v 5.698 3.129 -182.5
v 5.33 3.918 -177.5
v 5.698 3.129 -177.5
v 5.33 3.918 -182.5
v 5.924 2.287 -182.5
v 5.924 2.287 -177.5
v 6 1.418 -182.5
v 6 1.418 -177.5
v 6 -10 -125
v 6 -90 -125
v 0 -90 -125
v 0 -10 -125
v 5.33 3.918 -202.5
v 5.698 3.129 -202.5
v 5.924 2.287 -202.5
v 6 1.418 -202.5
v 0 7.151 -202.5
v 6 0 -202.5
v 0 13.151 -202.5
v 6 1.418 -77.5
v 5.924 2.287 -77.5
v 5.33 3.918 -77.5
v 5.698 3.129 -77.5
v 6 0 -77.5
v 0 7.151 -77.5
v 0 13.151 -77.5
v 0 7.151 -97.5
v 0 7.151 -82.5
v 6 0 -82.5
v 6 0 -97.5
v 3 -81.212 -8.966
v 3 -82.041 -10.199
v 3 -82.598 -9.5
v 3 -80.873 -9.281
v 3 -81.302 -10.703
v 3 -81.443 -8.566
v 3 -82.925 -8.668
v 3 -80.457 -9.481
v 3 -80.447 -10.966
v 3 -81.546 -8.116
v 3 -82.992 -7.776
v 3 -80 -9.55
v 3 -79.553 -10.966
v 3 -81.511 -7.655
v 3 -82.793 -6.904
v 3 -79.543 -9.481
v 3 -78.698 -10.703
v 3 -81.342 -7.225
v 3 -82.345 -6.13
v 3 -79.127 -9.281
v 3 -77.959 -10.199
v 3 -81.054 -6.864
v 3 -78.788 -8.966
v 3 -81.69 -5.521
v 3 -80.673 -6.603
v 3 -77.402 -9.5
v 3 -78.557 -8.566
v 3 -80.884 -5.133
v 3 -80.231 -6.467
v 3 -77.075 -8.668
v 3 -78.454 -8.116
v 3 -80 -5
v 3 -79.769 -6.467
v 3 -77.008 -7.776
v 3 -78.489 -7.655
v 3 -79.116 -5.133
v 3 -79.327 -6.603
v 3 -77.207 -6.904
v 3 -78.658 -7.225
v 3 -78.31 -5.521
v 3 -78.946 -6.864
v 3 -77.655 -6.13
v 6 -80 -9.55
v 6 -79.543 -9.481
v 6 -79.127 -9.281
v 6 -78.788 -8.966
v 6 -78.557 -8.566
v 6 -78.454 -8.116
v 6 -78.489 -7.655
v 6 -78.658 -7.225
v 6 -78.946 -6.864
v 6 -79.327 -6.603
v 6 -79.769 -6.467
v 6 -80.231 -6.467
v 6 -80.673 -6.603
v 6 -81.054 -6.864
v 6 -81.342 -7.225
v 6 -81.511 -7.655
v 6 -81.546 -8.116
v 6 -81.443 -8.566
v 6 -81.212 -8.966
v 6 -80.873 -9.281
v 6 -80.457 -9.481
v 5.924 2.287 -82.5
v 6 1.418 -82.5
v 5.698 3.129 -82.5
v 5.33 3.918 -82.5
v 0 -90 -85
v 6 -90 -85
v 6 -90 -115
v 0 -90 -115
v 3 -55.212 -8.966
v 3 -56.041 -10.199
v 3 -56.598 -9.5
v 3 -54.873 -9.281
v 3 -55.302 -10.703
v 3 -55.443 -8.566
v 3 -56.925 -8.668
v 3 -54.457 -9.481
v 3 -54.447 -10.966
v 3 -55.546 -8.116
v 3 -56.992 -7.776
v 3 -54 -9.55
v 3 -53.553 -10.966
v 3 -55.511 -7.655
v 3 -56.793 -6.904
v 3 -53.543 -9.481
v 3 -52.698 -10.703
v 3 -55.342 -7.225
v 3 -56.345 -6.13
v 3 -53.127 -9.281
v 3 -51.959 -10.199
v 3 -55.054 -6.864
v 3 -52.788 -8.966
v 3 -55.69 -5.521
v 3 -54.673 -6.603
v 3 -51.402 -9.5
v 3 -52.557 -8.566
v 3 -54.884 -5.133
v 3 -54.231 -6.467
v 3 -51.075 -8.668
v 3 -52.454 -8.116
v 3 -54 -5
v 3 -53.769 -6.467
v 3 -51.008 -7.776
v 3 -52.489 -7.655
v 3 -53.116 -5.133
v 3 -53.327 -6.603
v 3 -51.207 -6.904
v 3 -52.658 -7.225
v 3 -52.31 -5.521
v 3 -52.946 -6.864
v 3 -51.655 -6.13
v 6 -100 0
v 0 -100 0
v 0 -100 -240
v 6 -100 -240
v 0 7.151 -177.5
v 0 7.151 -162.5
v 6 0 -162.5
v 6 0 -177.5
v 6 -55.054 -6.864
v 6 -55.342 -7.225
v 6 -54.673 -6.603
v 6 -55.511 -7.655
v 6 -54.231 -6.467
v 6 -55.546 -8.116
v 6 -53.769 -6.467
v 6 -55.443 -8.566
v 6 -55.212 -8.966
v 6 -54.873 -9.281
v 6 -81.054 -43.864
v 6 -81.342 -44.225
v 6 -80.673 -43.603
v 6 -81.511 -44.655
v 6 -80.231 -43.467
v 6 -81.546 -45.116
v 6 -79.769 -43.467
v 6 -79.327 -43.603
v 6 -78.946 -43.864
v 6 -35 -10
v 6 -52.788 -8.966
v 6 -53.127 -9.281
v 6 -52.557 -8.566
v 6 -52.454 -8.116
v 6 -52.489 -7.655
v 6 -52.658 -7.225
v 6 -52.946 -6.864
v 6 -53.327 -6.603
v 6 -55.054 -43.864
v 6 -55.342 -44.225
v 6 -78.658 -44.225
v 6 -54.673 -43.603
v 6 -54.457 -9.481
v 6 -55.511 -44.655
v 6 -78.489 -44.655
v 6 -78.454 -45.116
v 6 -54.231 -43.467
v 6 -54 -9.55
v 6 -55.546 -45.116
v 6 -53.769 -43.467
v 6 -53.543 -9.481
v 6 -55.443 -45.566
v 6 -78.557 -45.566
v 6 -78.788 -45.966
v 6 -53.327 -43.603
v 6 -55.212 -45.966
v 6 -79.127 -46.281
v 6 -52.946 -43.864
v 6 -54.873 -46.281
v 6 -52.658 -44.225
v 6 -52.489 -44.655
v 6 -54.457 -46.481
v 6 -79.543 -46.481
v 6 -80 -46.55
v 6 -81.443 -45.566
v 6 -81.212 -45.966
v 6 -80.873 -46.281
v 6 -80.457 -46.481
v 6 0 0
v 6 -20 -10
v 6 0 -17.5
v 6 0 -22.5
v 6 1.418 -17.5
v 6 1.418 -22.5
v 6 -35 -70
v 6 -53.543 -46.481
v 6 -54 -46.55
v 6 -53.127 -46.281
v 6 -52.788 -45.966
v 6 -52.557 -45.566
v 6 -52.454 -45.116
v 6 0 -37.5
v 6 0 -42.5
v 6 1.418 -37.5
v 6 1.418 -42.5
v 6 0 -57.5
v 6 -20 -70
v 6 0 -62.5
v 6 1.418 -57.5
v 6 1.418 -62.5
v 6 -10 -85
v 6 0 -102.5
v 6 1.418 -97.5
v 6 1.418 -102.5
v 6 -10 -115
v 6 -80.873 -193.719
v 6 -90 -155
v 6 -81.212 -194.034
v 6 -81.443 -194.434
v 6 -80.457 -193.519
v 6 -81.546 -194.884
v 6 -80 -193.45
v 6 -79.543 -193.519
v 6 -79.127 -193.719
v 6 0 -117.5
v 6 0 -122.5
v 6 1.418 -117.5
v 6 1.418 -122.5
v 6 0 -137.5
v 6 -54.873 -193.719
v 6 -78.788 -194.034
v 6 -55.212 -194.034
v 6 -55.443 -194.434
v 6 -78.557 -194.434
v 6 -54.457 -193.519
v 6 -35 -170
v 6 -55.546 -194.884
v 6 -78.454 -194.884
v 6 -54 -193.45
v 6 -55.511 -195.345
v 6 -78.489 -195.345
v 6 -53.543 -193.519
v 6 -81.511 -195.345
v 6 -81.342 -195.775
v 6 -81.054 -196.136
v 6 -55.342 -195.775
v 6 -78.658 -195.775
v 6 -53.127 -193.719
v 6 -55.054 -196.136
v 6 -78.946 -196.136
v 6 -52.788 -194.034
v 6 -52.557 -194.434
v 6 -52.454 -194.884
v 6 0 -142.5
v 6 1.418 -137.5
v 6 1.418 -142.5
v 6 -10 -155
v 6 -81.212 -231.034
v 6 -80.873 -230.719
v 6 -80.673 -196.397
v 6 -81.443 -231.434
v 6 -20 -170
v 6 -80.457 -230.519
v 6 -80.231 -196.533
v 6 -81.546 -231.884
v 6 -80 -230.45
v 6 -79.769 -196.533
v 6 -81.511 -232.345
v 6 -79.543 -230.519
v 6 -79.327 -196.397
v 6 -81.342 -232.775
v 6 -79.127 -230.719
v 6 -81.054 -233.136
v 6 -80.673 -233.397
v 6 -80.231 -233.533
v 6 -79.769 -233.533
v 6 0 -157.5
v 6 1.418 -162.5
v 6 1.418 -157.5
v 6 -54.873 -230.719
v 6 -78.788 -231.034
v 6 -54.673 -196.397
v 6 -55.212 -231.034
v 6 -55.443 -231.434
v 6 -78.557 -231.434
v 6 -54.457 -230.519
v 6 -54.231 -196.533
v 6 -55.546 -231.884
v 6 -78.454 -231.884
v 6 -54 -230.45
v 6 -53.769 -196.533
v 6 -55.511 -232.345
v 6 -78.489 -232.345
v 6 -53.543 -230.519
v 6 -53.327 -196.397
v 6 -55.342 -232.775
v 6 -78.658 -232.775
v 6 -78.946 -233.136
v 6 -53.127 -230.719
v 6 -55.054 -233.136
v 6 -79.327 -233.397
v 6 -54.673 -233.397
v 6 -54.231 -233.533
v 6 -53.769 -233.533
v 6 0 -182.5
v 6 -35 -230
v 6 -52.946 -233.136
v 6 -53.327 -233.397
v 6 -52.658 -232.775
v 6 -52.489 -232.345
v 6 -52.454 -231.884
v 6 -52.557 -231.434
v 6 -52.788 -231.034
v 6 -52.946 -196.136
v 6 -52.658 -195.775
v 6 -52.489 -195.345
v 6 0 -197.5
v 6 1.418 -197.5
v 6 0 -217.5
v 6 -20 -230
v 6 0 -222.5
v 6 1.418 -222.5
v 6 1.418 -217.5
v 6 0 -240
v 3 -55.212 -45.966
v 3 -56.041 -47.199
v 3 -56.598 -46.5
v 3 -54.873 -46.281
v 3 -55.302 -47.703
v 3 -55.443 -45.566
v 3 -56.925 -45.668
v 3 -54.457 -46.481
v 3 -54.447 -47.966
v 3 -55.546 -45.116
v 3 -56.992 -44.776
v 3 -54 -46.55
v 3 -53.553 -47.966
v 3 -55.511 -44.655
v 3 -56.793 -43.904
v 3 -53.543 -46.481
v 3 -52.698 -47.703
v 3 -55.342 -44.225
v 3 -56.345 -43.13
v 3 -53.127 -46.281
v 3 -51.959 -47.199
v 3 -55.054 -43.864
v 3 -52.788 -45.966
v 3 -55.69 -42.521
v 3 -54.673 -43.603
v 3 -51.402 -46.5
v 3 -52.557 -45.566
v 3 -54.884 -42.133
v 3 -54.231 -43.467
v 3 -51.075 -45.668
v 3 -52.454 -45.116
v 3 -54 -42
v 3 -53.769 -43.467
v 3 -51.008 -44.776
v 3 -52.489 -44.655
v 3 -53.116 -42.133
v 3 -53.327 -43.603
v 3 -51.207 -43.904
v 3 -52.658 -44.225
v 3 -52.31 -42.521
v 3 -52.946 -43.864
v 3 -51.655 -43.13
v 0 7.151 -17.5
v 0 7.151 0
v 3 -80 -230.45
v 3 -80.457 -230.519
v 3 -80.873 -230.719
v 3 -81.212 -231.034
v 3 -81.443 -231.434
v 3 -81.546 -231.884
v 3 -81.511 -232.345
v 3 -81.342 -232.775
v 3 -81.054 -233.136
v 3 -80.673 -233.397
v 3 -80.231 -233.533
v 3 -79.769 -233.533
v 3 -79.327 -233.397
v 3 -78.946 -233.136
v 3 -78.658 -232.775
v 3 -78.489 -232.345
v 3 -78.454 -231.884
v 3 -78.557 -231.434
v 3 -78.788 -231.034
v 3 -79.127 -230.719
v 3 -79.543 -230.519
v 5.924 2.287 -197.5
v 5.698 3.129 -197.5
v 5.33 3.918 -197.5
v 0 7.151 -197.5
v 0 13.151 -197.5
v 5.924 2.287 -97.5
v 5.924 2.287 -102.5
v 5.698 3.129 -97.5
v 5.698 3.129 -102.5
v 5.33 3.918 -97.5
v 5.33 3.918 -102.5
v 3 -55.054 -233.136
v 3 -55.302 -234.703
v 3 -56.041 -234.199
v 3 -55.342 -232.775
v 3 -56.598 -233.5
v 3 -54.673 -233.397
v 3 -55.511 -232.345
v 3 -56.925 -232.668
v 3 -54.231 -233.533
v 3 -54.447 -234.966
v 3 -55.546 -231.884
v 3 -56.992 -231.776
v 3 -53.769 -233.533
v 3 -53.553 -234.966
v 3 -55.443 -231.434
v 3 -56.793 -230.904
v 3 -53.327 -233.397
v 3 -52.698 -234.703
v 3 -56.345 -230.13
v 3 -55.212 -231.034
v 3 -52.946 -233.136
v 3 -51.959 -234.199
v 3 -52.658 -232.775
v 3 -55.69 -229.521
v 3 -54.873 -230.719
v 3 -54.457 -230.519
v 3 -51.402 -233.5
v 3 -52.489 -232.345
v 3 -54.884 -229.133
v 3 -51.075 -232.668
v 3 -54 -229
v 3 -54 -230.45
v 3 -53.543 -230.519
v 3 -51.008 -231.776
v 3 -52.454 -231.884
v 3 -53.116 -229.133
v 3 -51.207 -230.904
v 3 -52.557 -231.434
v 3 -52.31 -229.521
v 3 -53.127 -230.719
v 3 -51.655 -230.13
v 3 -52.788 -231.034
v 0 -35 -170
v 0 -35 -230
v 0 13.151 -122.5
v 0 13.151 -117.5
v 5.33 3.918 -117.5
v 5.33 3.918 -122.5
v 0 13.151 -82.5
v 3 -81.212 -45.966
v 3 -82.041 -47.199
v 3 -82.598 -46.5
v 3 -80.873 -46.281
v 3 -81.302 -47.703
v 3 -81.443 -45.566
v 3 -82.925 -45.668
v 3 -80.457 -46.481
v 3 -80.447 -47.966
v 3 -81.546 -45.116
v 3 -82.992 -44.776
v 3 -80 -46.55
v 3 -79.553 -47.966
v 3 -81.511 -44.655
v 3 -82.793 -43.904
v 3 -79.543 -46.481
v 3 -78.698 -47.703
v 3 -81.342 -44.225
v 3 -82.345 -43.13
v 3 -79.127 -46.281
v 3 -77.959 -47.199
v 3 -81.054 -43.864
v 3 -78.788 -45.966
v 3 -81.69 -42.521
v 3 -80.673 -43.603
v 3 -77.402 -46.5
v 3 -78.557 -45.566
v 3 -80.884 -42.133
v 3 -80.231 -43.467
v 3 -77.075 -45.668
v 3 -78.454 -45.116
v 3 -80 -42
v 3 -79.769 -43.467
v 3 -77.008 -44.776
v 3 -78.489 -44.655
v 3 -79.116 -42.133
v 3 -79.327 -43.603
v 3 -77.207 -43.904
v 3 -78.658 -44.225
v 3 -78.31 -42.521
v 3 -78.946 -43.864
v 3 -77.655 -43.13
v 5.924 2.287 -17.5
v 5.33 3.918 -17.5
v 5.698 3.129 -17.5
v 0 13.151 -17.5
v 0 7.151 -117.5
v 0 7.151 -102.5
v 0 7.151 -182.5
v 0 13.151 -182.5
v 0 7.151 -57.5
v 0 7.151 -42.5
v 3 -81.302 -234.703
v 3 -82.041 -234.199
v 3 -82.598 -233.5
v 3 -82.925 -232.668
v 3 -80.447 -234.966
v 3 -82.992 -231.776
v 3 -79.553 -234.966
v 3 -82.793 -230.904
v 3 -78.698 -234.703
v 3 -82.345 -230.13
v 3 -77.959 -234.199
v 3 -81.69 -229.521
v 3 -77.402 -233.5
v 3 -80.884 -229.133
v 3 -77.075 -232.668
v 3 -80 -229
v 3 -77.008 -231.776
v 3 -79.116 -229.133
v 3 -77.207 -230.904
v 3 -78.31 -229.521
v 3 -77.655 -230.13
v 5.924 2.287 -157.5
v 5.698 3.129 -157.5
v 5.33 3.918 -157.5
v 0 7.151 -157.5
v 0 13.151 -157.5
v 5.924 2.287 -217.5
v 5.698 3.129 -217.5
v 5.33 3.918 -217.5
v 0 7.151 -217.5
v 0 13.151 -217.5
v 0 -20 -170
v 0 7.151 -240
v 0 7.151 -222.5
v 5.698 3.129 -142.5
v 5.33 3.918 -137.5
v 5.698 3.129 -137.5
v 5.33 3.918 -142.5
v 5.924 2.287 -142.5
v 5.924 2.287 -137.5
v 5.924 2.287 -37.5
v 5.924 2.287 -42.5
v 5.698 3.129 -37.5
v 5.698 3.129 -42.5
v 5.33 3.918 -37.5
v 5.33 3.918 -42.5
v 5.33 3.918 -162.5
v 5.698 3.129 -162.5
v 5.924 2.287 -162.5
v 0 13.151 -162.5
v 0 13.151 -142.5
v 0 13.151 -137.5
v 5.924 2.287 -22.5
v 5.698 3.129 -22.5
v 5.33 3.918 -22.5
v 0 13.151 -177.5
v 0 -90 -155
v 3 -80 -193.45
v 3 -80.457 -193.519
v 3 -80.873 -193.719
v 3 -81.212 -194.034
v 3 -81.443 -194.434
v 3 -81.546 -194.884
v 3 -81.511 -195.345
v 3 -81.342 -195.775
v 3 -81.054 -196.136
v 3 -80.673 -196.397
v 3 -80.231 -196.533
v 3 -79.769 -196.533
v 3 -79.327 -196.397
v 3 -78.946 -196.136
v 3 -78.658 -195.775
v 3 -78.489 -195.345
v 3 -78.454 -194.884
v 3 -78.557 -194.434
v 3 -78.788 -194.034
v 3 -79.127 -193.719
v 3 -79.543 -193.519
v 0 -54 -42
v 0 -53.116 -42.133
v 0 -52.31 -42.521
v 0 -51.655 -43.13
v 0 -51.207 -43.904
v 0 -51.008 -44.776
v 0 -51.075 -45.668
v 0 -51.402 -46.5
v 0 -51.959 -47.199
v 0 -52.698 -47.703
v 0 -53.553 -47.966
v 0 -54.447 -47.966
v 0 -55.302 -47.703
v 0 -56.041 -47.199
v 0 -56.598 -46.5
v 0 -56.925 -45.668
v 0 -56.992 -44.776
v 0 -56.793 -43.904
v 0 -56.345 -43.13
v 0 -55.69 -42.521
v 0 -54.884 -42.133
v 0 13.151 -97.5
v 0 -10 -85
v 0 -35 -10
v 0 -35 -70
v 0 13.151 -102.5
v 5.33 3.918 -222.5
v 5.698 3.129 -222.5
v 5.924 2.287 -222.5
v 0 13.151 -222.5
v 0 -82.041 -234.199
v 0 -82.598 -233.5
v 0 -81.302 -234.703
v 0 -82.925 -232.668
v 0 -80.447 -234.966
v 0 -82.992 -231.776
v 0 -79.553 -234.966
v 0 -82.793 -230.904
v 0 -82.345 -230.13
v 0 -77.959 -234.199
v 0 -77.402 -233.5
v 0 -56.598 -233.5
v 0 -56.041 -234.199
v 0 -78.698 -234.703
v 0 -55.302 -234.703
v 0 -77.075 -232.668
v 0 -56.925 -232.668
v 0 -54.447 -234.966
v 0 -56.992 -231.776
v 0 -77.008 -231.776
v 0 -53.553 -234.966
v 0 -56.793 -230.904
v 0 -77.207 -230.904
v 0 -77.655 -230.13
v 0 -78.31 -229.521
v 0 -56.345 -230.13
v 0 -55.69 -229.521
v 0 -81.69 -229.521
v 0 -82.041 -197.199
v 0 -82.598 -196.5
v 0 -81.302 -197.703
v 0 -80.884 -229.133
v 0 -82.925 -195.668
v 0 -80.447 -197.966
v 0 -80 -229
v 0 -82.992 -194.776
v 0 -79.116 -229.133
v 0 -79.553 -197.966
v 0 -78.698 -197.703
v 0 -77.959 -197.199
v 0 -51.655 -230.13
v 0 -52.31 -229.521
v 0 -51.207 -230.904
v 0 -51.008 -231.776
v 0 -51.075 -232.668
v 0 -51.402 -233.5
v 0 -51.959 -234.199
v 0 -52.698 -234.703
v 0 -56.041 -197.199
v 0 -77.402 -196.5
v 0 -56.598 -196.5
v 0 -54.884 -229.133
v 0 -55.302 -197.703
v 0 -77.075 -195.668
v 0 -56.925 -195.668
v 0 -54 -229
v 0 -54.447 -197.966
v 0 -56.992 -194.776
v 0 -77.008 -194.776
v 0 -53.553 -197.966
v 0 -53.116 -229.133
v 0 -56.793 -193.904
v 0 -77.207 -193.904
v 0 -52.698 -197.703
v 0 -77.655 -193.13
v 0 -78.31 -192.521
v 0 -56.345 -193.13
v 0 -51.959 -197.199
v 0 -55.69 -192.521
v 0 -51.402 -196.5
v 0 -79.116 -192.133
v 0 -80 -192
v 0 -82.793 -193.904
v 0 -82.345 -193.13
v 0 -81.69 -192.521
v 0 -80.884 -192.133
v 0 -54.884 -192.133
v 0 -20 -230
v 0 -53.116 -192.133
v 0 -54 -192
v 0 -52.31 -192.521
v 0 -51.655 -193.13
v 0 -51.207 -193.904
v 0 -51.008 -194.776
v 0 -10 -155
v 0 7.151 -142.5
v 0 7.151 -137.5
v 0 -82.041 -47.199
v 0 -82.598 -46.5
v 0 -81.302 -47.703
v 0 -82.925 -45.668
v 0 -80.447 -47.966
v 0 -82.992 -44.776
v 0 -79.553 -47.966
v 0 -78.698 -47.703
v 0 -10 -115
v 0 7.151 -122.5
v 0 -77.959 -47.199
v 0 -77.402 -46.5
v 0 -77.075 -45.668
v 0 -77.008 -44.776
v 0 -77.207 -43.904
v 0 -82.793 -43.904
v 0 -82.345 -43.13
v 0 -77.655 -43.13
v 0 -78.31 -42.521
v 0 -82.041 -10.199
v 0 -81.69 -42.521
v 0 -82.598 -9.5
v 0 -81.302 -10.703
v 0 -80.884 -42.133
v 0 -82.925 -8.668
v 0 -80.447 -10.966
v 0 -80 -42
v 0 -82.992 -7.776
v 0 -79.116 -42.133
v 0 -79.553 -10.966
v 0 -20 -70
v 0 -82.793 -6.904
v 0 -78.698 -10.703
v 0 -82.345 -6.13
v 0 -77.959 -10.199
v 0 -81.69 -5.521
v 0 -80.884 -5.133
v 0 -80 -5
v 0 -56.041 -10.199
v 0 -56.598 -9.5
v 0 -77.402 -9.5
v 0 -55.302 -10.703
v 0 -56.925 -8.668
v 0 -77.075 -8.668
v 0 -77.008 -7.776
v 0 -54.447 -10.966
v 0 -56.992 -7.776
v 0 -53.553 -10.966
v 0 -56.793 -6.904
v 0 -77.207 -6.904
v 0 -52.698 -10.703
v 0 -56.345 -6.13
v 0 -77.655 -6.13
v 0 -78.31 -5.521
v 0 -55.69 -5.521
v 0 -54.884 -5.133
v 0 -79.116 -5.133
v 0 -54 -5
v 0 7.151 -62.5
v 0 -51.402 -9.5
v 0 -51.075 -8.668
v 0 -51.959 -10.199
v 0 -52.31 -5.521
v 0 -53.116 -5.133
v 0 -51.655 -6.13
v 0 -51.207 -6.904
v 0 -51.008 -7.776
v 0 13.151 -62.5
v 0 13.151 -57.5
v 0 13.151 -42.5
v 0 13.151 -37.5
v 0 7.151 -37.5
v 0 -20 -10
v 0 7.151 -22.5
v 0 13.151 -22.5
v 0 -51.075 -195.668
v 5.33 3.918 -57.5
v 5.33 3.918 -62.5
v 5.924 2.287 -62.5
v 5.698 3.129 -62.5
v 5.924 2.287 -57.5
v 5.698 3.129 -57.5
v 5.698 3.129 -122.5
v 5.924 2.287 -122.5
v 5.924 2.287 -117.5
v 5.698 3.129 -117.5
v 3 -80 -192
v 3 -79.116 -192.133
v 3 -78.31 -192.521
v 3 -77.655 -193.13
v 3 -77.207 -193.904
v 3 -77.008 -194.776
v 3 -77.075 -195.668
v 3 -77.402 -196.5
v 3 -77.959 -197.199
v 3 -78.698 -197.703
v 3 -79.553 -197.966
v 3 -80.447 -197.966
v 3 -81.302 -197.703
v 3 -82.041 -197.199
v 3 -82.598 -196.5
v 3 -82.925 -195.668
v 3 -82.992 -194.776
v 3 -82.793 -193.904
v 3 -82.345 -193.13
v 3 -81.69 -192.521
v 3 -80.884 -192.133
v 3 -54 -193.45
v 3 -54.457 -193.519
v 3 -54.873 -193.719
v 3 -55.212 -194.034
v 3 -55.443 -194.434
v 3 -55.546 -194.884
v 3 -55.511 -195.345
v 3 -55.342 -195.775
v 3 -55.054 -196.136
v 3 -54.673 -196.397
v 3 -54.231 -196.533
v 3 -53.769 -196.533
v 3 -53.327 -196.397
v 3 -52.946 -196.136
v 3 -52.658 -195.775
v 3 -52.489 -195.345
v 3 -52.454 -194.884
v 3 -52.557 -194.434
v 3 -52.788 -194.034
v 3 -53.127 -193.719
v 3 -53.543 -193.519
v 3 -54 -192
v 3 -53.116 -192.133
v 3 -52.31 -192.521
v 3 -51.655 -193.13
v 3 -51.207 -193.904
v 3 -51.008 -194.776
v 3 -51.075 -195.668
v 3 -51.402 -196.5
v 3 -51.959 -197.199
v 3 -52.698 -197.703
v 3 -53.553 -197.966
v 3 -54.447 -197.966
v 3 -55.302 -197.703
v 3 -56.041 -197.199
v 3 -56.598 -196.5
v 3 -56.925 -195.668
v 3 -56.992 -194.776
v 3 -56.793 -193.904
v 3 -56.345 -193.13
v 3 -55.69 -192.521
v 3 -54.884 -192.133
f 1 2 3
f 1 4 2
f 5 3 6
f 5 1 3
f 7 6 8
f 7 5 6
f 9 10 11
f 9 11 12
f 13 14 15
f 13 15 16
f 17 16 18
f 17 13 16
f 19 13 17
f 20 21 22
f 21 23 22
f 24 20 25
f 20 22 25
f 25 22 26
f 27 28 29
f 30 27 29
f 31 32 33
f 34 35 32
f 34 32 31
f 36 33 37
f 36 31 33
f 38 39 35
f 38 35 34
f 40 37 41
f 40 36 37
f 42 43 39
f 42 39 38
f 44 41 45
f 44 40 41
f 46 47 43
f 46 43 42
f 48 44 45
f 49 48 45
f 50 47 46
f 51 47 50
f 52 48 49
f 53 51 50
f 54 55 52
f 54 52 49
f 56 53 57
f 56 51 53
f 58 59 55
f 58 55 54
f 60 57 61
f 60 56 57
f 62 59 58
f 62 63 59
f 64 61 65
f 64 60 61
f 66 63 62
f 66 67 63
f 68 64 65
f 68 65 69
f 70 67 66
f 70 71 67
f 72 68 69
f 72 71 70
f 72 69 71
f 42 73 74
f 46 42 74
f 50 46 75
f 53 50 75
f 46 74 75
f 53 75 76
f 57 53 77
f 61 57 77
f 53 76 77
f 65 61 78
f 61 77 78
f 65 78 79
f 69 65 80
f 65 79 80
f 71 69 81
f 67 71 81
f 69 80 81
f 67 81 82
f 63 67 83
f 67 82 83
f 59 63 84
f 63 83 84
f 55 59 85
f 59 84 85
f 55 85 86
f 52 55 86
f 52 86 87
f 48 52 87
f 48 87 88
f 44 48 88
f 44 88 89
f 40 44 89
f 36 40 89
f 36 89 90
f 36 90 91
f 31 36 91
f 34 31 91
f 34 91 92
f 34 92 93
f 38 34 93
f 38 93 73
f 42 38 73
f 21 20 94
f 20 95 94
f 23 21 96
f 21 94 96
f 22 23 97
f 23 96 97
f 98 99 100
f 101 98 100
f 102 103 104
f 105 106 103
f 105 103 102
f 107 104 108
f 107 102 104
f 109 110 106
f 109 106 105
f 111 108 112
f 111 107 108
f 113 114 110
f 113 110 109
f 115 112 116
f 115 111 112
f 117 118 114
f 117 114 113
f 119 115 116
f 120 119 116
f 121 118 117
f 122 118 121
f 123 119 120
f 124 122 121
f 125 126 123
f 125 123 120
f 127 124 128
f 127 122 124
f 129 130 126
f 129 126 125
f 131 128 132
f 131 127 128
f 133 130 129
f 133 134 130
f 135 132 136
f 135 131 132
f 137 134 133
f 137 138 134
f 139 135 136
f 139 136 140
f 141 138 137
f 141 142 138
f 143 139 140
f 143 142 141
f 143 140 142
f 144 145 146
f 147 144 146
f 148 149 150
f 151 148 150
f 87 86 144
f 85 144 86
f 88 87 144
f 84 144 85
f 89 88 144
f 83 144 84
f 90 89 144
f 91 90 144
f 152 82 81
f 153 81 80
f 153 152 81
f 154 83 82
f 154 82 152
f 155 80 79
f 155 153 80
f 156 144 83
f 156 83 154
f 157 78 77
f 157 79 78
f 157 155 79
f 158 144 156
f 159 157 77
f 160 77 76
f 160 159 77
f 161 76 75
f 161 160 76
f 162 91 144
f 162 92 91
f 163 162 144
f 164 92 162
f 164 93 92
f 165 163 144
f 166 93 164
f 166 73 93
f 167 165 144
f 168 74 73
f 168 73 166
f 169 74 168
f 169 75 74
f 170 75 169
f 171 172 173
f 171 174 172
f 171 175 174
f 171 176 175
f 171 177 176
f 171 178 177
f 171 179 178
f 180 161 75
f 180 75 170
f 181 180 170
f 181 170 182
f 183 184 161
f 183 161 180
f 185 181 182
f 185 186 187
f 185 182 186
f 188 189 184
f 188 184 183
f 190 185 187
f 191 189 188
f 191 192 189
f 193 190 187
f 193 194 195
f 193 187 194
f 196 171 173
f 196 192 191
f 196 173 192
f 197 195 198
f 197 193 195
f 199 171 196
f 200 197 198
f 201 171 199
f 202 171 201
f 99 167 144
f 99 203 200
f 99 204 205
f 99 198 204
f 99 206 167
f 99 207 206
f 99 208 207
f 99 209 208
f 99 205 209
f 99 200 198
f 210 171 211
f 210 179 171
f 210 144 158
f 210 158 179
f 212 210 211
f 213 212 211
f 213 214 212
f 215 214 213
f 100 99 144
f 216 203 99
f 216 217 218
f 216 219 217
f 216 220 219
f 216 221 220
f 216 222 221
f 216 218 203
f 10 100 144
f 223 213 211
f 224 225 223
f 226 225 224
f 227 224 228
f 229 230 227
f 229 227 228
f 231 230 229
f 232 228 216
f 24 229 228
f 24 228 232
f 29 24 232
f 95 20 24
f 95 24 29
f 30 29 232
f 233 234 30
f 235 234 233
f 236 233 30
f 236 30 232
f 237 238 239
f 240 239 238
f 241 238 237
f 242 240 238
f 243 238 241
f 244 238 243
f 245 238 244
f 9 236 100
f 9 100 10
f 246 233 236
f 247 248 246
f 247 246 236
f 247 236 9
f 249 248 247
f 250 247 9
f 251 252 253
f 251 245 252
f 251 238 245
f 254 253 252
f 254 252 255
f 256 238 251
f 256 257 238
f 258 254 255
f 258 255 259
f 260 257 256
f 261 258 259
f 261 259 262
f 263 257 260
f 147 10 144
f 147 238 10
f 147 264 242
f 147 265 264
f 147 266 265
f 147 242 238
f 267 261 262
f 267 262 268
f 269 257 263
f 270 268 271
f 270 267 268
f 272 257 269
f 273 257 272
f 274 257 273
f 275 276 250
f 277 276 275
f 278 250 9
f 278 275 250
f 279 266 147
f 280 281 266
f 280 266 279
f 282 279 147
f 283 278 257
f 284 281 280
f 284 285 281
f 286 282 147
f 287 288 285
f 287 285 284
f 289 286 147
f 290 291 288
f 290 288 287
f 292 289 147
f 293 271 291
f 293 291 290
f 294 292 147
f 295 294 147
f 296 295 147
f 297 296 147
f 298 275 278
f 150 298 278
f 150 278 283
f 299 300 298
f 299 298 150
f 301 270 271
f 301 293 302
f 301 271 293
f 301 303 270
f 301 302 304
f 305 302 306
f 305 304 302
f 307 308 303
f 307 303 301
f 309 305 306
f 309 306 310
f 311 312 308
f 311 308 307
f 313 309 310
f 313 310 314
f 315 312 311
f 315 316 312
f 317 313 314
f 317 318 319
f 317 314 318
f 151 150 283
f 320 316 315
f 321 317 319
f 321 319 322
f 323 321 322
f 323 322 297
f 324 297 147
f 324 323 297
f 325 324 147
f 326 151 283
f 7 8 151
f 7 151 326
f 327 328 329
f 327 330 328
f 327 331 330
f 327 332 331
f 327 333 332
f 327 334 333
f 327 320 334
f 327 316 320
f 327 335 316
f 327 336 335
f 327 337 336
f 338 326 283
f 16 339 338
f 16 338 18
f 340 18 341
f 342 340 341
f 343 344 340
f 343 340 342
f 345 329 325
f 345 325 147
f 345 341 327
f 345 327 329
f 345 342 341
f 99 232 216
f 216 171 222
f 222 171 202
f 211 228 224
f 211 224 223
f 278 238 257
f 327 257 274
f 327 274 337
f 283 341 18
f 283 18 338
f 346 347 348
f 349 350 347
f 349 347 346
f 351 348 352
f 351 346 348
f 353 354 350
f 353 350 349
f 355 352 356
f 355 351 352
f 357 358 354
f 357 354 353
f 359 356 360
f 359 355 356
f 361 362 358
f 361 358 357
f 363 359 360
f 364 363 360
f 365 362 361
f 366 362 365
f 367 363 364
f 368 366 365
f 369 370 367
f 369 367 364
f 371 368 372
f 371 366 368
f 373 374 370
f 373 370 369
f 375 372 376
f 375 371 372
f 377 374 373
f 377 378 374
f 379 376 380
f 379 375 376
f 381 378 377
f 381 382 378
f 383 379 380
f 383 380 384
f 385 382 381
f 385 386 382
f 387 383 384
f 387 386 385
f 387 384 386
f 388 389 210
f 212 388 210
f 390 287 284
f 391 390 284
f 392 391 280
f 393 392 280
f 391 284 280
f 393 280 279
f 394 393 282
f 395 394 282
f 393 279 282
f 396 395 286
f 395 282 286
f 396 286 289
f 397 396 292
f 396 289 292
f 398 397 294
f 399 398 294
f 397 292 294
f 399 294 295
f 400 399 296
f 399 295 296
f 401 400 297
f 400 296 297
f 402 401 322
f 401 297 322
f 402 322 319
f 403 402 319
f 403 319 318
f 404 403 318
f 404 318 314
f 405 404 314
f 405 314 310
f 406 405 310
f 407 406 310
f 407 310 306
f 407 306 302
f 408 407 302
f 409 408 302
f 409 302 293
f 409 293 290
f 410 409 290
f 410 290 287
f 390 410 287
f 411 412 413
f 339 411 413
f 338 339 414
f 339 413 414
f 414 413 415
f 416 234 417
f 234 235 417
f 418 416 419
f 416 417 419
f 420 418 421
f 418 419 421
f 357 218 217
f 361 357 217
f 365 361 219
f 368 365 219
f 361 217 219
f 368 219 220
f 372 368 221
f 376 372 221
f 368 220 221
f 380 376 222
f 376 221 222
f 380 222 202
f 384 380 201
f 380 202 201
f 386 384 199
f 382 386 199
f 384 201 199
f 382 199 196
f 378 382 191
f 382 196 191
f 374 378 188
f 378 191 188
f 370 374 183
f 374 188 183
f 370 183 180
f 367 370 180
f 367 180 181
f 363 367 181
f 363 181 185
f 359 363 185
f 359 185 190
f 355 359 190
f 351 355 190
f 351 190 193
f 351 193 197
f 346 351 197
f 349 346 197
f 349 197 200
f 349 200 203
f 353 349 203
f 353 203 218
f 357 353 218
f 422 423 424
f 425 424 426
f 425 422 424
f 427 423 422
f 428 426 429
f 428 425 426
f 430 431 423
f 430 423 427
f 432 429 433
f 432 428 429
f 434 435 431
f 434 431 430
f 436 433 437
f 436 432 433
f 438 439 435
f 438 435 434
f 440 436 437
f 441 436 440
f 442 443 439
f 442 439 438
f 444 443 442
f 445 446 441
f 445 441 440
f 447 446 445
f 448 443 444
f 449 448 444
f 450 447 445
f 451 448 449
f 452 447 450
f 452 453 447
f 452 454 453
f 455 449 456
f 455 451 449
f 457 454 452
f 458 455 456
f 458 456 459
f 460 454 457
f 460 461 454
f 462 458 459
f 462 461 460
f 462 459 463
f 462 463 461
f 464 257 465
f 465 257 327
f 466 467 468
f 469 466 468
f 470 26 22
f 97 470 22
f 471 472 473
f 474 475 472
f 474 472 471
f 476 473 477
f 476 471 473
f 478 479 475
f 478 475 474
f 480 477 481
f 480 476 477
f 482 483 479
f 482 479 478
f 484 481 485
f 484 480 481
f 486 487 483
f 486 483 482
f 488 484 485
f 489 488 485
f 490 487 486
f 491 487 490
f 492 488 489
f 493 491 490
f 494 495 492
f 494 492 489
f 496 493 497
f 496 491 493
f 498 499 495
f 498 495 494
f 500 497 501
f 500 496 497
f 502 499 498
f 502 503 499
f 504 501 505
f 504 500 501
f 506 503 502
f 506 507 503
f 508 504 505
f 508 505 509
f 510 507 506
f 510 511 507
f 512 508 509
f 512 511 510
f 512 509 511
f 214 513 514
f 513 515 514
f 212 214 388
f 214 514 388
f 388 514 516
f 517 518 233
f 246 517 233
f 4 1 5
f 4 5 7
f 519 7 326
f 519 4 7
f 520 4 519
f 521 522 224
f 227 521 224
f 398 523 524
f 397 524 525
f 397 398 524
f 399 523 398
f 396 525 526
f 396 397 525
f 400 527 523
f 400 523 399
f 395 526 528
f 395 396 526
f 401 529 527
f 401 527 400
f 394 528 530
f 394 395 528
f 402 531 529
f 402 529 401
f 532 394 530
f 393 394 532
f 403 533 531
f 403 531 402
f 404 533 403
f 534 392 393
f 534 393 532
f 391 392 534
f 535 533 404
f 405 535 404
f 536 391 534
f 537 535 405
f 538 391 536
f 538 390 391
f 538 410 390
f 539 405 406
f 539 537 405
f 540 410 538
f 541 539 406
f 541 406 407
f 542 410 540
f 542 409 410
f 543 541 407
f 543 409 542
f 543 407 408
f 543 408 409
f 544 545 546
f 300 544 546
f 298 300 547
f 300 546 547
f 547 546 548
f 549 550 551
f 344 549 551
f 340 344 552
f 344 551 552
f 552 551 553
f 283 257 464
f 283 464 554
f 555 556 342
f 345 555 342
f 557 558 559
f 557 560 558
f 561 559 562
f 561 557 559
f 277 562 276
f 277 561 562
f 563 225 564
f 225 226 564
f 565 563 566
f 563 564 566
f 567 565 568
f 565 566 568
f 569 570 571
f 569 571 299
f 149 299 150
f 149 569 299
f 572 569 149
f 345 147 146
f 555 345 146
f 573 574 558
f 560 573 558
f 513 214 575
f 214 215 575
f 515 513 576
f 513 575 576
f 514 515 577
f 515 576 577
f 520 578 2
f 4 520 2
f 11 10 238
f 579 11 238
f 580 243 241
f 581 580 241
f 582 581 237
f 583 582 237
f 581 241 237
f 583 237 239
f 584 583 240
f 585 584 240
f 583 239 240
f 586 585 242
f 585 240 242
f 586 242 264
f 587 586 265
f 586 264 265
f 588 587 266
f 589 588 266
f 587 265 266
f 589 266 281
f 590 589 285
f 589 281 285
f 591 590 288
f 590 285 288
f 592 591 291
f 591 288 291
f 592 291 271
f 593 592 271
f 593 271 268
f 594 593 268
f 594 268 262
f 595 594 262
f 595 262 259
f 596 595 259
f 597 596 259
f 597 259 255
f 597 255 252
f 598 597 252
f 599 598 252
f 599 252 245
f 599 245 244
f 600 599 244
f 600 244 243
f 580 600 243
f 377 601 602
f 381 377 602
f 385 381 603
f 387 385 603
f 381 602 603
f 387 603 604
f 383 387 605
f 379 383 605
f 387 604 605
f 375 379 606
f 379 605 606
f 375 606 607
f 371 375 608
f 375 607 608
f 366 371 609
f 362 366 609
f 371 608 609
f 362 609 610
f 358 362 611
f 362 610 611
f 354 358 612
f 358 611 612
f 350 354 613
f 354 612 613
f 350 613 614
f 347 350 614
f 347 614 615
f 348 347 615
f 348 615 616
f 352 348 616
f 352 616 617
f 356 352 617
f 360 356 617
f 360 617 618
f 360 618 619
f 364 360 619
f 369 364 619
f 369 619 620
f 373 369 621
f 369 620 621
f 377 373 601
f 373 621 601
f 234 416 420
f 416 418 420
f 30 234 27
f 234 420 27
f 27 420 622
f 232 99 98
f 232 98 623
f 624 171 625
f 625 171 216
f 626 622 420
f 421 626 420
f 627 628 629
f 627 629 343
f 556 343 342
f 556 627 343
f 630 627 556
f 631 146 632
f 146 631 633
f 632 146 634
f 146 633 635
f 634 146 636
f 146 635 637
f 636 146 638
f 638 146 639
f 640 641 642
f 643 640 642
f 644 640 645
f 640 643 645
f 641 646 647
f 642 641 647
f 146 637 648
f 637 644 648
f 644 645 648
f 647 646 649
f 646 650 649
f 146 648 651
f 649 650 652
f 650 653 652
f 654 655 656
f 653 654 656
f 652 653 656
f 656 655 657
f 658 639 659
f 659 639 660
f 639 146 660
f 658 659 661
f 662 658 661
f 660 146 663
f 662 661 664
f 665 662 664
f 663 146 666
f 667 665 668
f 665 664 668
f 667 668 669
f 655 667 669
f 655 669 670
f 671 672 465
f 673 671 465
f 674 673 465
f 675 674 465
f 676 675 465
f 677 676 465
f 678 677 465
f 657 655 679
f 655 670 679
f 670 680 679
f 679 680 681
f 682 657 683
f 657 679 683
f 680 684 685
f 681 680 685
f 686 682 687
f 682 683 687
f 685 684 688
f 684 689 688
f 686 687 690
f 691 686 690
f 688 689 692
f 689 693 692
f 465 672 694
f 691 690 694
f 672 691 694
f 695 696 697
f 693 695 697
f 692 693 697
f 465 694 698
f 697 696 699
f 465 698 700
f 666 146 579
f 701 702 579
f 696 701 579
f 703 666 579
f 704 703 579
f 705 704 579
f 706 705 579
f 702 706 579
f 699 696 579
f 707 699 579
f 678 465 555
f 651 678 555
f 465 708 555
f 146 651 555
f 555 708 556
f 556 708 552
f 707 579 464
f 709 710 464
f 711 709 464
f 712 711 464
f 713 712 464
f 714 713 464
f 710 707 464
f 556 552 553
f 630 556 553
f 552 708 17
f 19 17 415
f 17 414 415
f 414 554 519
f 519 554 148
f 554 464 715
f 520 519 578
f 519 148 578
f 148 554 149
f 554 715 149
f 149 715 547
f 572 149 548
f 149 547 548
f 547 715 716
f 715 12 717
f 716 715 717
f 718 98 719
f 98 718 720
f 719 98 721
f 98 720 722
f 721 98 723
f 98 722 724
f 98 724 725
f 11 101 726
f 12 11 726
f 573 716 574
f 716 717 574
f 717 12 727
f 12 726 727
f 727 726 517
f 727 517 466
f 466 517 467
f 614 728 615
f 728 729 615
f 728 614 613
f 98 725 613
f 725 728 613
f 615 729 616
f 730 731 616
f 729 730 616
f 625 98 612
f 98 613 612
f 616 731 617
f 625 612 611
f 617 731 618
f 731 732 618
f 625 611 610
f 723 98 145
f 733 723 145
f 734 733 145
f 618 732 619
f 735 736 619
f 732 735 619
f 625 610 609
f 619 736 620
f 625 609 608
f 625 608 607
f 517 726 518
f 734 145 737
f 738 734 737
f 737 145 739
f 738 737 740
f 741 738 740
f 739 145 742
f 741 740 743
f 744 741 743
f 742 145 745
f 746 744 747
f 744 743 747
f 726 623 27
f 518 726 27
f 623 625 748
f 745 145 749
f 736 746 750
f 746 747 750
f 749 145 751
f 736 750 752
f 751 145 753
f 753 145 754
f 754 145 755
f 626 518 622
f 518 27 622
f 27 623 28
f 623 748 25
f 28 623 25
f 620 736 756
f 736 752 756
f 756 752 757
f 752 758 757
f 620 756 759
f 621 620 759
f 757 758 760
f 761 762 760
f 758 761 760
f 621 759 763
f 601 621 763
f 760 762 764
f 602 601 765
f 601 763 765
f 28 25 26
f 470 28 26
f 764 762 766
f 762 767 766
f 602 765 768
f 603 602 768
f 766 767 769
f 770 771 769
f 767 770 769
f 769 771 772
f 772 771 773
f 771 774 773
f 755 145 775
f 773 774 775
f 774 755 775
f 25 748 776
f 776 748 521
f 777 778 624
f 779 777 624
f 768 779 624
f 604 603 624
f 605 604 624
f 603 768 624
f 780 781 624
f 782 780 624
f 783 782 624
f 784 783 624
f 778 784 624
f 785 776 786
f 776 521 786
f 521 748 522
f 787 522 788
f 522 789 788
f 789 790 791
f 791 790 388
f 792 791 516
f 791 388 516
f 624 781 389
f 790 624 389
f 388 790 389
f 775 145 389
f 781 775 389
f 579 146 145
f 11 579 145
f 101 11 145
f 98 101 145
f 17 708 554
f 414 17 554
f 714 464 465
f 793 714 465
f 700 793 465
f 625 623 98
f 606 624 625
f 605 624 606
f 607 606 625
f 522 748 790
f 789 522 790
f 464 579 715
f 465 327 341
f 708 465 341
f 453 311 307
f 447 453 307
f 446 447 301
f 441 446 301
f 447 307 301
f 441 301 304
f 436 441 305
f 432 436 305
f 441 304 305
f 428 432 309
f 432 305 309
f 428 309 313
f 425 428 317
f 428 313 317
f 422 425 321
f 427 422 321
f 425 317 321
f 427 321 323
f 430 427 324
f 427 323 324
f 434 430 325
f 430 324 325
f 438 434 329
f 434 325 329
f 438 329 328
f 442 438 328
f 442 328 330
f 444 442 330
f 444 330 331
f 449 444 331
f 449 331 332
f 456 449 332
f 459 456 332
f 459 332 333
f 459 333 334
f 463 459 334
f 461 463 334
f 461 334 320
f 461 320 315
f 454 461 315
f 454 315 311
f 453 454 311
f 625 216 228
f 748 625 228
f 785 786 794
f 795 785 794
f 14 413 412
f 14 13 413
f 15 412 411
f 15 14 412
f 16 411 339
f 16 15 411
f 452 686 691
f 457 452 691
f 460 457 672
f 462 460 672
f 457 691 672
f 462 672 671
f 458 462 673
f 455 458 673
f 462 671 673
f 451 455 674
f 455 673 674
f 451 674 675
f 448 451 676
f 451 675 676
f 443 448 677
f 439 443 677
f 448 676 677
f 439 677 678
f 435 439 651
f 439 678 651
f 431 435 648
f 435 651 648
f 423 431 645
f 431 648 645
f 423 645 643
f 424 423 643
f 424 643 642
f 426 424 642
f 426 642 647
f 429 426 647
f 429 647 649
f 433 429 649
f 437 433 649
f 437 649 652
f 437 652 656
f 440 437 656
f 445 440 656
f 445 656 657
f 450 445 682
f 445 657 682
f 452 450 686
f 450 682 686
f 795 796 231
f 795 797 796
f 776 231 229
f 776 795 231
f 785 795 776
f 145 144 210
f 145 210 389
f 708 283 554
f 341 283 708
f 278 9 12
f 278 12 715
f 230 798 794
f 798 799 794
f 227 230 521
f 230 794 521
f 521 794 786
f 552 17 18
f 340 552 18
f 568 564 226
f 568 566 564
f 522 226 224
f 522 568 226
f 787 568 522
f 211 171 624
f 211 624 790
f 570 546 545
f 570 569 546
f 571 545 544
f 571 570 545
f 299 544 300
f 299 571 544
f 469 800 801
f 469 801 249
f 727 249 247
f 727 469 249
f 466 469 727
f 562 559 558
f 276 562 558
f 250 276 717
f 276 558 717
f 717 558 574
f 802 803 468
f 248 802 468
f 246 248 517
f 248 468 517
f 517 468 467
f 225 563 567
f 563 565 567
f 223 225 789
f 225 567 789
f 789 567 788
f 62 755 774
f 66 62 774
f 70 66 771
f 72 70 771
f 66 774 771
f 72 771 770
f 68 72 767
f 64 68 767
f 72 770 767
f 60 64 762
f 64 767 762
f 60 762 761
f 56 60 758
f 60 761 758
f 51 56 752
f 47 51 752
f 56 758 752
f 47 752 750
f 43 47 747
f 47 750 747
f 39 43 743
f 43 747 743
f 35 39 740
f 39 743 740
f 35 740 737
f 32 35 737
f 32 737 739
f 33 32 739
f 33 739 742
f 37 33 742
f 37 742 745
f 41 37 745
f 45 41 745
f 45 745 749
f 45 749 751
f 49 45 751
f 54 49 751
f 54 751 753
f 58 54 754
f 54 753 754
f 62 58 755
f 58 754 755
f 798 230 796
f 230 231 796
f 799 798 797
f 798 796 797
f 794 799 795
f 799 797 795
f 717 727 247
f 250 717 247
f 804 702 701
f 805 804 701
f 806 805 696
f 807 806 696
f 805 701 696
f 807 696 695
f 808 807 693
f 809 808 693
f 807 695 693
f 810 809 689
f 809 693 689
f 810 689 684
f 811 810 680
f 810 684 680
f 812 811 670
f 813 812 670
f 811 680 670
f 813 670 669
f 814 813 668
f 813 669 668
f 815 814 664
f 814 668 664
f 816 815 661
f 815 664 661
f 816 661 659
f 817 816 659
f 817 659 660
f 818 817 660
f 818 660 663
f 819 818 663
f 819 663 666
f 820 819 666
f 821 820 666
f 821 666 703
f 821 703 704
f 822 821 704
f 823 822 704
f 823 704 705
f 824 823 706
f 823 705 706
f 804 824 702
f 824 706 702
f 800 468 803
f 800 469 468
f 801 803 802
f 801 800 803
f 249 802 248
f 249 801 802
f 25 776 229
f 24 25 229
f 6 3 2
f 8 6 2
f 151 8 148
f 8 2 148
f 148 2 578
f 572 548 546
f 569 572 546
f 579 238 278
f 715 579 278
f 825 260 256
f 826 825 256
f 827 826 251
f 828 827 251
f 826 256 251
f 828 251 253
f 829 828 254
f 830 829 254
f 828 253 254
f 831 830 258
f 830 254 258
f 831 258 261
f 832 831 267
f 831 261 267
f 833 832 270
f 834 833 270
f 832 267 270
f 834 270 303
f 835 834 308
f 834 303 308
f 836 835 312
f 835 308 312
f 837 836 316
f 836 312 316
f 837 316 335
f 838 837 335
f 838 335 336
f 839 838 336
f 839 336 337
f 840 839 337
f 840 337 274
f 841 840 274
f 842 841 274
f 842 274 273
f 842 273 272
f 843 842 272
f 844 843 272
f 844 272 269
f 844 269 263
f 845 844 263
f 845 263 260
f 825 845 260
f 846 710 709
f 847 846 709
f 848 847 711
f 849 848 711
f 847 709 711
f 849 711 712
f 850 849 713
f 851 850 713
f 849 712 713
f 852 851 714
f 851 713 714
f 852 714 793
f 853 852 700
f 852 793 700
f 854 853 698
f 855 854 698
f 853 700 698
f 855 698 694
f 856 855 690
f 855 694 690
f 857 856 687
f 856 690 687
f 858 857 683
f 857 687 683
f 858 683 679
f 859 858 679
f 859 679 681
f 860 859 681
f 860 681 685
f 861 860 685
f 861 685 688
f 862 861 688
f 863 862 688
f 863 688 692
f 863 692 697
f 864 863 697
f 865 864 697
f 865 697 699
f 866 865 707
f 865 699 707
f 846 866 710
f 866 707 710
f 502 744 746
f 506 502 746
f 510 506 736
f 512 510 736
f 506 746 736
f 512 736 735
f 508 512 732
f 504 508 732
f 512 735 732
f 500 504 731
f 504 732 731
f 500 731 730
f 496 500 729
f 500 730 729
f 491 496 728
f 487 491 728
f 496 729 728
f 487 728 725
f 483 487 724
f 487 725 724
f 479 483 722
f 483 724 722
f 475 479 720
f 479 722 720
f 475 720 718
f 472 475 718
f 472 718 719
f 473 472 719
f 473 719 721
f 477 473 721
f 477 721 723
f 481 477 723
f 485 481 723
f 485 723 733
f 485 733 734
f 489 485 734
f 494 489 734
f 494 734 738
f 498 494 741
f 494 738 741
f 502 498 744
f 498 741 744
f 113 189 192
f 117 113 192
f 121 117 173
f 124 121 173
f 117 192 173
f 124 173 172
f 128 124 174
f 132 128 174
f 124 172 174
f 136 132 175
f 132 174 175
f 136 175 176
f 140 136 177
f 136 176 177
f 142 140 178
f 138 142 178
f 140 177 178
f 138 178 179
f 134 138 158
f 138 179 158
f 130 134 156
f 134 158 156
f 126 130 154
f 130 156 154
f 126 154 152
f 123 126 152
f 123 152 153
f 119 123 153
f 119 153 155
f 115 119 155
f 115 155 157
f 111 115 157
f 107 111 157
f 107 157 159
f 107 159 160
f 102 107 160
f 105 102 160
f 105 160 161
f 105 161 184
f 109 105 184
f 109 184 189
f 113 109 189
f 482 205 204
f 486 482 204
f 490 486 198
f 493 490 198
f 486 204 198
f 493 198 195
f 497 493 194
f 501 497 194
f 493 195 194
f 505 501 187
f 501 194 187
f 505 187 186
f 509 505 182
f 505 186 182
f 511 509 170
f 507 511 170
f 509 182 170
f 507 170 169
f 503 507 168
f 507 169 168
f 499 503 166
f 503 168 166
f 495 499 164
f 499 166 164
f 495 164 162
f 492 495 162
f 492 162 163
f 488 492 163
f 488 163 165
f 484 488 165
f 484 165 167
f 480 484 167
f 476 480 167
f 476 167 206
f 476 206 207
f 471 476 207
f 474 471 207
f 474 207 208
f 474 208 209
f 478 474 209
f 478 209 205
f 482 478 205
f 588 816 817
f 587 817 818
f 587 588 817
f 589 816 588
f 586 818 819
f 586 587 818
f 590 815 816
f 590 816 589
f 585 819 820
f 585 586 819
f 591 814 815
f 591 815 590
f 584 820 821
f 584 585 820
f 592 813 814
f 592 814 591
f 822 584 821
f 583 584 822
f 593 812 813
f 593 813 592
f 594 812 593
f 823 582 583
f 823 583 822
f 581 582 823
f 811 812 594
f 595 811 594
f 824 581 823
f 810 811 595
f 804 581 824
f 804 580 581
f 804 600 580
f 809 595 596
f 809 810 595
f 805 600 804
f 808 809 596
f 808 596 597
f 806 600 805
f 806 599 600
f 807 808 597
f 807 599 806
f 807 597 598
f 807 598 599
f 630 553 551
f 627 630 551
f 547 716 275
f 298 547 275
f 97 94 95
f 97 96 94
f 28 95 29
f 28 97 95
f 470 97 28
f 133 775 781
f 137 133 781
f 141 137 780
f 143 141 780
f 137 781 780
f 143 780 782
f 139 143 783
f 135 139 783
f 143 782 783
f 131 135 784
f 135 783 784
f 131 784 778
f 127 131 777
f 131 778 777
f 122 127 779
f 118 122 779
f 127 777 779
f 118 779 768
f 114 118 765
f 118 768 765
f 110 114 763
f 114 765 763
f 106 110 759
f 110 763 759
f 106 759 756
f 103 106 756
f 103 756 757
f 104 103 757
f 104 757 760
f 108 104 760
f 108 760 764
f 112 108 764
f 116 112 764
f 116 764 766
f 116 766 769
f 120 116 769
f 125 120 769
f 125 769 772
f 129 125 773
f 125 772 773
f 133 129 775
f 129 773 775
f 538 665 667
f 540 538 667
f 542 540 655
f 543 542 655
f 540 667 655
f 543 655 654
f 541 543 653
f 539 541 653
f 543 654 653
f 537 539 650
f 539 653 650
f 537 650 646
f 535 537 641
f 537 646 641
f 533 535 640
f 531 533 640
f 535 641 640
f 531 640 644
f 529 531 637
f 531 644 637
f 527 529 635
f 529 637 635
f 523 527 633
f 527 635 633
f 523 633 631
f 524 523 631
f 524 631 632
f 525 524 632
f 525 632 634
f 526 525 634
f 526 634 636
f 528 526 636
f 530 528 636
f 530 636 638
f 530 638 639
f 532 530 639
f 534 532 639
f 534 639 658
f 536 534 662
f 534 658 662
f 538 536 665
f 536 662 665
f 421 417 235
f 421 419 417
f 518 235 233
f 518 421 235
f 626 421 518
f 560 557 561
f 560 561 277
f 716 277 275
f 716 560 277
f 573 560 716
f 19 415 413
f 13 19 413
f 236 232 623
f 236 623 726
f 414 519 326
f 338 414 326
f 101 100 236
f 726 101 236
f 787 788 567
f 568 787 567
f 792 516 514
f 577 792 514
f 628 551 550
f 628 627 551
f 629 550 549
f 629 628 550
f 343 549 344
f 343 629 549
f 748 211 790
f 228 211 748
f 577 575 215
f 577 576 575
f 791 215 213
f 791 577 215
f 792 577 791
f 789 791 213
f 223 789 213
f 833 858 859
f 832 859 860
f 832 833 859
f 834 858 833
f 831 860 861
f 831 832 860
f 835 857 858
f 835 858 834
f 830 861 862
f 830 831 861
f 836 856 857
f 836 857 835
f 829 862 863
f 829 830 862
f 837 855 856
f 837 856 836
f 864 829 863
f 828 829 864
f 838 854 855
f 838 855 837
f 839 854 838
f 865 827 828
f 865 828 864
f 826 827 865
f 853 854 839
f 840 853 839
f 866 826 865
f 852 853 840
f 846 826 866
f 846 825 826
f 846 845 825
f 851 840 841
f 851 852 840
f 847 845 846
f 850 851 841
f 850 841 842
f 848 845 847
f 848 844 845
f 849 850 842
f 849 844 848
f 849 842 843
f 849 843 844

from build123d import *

# Parameters (mm, degrees)
SKETCH_1_W                 = 240
SKETCH_1_H                 = 100
EXTRUDE_1_DEPTH            = 6
SKETCH_2_R                 = 1.55
CUT_EXTRUDE_1_DEPTH        = 261.069221555
SKETCH_3_W                 = 60
SKETCH_3_H                 = 15
CUT_EXTRUDE_2_DEPTH        = 261.069221555
SKETCH_4_W                 = 30
SKETCH_4_H                 = 80
CUT_EXTRUDE_3_DEPTH        = 261.069221555
SKETCH_5_R                 = 3
CUT_EXTRUDE_4_DEPTH        = 3
EXTRUDE_2_DEPTH            = 240
EXTRUDE_3_DEPTH            = 5
PATTERN_LINEAR_1_COUNT     = 6
PATTERN_LINEAR_1_PITCH     = 20
PATTERN_LINEAR_1_COL_COUNT = 6
PATTERN_LINEAR_1_COL_PITCH = 20
FILLET_1_R                 = 5


with BuildPart() as part:
    # 草图1 → 凸台-拉伸1 (new body)
    with BuildSketch(Plane(origin=(0, 0, 0), x_dir=(0, 0, -1), z_dir=(1, 0, 0))):
        with Locations((120, -50)):
            Rectangle(SKETCH_1_W, SKETCH_1_H)
    extrude(amount=EXTRUDE_1_DEPTH)

    # 草图2 → 切除-拉伸1 (cut, through all)
    with BuildSketch(Plane(origin=(6, 0, 0), x_dir=(0, 0, -1), z_dir=(1, 0, 0))):
        with Locations((8, -54)):
            Circle(SKETCH_2_R)
        with Locations((45, -80)):
            Circle(SKETCH_2_R)
        with Locations((45, -54)):
            Circle(SKETCH_2_R)
        with Locations((8, -80)):
            Circle(SKETCH_2_R)
        with Locations(Location((232, -80, 0), (0, 0, 180))):
            Circle(SKETCH_2_R)
        with Locations(Location((195, -54, 0), (0, 0, 180))):
            Circle(SKETCH_2_R)
        with Locations(Location((195, -80, 0), (0, 0, 180))):
            Circle(SKETCH_2_R)
        with Locations(Location((232, -54, 0), (0, 0, 180))):
            Circle(SKETCH_2_R)
    extrude(amount=-CUT_EXTRUDE_1_DEPTH, mode=Mode.SUBTRACT)

    # 草图3 → 切除-拉伸2 (cut, through all)
    with BuildSketch(Plane(origin=(6, 0, 0), x_dir=(0, 0, -1), z_dir=(1, 0, 0))):
        with Locations((40, -27.5)):
            Rectangle(SKETCH_3_W, SKETCH_3_H)
        with Locations((200, -27.5)):
            Rectangle(SKETCH_3_W, SKETCH_3_H)
    extrude(amount=-CUT_EXTRUDE_2_DEPTH, mode=Mode.SUBTRACT)

    # 草图4 → 切除-拉伸3 (cut, through all)
    with BuildSketch(Plane(origin=(6, 0, 0), x_dir=(0, 0, -1), z_dir=(1, 0, 0))):
        with Locations((100, -50)):
            Rectangle(SKETCH_4_W, SKETCH_4_H)
        with Locations((140, -50)):
            Rectangle(SKETCH_4_W, SKETCH_4_H)
    extrude(amount=-CUT_EXTRUDE_3_DEPTH, mode=Mode.SUBTRACT)

    # 草图5 → 切除-拉伸4 (cut)
    with BuildSketch(Plane.ZY):
        with Locations((-195, -80)):
            Circle(SKETCH_5_R)
        with Locations((-232, -80)):
            Circle(SKETCH_5_R)
        with Locations((-195, -54)):
            Circle(SKETCH_5_R)
        with Locations((-232, -54)):
            Circle(SKETCH_5_R)
        with Locations((-45, -80)):
            Circle(SKETCH_5_R)
        with Locations((-8, -80)):
            Circle(SKETCH_5_R)
        with Locations((-8, -54)):
            Circle(SKETCH_5_R)
        with Locations((-45, -54)):
            Circle(SKETCH_5_R)
    extrude(amount=-CUT_EXTRUDE_4_DEPTH, mode=Mode.SUBTRACT)

    # 草图6 → 凸台-拉伸2 (add)
    with BuildSketch(Plane.XY):
        Polygon((6, 0), (0, 0), (0, 7.150521556), align=None)
    extrude(amount=-EXTRUDE_2_DEPTH)

    # 草图7 → 凸台-拉伸3 (add)
    with BuildSketch(Plane.XY.offset(-117.5)):
        Polygon((0, 7.150521556), (0, 13.150521556), (6, 2.75821671), (6, 0), align=None)
    extrude_3 = extrude(amount=-EXTRUDE_3_DEPTH)

    # 阵列(线性)1: 凸台-拉伸3 ×6
    with Locations(*[(0, 0, -i * PATTERN_LINEAR_1_PITCH) for i in range(1, PATTERN_LINEAR_1_COUNT)]):
        add(extrude_3)

    # 阵列(线性)1 col: 凸台-拉伸3 ×6
    with Locations(*[(0, 0, i * PATTERN_LINEAR_1_COL_PITCH) for i in range(1, PATTERN_LINEAR_1_COL_COUNT)]):
        add(extrude_3)

    # 圆角1
    fillet_1_edges = [part.edges().sort_by_distance(p)[0] for p in [
        (6, 2.75821671, -120),
        (6, 2.75821671, -100),
        (6, 2.75821671, -80),
        (6, 2.75821671, -60),
        (6, 2.75821671, -40),
        (6, 2.75821671, -20),
        (6, 2.75821671, -140),
        (6, 2.75821671, -160),
        (6, 2.75821671, -180),
        (6, 2.75821671, -200),
        (6, 2.75821671, -220),
    ]]
    fillet(fillet_1_edges, radius=FILLET_1_R)


solid = part.part
